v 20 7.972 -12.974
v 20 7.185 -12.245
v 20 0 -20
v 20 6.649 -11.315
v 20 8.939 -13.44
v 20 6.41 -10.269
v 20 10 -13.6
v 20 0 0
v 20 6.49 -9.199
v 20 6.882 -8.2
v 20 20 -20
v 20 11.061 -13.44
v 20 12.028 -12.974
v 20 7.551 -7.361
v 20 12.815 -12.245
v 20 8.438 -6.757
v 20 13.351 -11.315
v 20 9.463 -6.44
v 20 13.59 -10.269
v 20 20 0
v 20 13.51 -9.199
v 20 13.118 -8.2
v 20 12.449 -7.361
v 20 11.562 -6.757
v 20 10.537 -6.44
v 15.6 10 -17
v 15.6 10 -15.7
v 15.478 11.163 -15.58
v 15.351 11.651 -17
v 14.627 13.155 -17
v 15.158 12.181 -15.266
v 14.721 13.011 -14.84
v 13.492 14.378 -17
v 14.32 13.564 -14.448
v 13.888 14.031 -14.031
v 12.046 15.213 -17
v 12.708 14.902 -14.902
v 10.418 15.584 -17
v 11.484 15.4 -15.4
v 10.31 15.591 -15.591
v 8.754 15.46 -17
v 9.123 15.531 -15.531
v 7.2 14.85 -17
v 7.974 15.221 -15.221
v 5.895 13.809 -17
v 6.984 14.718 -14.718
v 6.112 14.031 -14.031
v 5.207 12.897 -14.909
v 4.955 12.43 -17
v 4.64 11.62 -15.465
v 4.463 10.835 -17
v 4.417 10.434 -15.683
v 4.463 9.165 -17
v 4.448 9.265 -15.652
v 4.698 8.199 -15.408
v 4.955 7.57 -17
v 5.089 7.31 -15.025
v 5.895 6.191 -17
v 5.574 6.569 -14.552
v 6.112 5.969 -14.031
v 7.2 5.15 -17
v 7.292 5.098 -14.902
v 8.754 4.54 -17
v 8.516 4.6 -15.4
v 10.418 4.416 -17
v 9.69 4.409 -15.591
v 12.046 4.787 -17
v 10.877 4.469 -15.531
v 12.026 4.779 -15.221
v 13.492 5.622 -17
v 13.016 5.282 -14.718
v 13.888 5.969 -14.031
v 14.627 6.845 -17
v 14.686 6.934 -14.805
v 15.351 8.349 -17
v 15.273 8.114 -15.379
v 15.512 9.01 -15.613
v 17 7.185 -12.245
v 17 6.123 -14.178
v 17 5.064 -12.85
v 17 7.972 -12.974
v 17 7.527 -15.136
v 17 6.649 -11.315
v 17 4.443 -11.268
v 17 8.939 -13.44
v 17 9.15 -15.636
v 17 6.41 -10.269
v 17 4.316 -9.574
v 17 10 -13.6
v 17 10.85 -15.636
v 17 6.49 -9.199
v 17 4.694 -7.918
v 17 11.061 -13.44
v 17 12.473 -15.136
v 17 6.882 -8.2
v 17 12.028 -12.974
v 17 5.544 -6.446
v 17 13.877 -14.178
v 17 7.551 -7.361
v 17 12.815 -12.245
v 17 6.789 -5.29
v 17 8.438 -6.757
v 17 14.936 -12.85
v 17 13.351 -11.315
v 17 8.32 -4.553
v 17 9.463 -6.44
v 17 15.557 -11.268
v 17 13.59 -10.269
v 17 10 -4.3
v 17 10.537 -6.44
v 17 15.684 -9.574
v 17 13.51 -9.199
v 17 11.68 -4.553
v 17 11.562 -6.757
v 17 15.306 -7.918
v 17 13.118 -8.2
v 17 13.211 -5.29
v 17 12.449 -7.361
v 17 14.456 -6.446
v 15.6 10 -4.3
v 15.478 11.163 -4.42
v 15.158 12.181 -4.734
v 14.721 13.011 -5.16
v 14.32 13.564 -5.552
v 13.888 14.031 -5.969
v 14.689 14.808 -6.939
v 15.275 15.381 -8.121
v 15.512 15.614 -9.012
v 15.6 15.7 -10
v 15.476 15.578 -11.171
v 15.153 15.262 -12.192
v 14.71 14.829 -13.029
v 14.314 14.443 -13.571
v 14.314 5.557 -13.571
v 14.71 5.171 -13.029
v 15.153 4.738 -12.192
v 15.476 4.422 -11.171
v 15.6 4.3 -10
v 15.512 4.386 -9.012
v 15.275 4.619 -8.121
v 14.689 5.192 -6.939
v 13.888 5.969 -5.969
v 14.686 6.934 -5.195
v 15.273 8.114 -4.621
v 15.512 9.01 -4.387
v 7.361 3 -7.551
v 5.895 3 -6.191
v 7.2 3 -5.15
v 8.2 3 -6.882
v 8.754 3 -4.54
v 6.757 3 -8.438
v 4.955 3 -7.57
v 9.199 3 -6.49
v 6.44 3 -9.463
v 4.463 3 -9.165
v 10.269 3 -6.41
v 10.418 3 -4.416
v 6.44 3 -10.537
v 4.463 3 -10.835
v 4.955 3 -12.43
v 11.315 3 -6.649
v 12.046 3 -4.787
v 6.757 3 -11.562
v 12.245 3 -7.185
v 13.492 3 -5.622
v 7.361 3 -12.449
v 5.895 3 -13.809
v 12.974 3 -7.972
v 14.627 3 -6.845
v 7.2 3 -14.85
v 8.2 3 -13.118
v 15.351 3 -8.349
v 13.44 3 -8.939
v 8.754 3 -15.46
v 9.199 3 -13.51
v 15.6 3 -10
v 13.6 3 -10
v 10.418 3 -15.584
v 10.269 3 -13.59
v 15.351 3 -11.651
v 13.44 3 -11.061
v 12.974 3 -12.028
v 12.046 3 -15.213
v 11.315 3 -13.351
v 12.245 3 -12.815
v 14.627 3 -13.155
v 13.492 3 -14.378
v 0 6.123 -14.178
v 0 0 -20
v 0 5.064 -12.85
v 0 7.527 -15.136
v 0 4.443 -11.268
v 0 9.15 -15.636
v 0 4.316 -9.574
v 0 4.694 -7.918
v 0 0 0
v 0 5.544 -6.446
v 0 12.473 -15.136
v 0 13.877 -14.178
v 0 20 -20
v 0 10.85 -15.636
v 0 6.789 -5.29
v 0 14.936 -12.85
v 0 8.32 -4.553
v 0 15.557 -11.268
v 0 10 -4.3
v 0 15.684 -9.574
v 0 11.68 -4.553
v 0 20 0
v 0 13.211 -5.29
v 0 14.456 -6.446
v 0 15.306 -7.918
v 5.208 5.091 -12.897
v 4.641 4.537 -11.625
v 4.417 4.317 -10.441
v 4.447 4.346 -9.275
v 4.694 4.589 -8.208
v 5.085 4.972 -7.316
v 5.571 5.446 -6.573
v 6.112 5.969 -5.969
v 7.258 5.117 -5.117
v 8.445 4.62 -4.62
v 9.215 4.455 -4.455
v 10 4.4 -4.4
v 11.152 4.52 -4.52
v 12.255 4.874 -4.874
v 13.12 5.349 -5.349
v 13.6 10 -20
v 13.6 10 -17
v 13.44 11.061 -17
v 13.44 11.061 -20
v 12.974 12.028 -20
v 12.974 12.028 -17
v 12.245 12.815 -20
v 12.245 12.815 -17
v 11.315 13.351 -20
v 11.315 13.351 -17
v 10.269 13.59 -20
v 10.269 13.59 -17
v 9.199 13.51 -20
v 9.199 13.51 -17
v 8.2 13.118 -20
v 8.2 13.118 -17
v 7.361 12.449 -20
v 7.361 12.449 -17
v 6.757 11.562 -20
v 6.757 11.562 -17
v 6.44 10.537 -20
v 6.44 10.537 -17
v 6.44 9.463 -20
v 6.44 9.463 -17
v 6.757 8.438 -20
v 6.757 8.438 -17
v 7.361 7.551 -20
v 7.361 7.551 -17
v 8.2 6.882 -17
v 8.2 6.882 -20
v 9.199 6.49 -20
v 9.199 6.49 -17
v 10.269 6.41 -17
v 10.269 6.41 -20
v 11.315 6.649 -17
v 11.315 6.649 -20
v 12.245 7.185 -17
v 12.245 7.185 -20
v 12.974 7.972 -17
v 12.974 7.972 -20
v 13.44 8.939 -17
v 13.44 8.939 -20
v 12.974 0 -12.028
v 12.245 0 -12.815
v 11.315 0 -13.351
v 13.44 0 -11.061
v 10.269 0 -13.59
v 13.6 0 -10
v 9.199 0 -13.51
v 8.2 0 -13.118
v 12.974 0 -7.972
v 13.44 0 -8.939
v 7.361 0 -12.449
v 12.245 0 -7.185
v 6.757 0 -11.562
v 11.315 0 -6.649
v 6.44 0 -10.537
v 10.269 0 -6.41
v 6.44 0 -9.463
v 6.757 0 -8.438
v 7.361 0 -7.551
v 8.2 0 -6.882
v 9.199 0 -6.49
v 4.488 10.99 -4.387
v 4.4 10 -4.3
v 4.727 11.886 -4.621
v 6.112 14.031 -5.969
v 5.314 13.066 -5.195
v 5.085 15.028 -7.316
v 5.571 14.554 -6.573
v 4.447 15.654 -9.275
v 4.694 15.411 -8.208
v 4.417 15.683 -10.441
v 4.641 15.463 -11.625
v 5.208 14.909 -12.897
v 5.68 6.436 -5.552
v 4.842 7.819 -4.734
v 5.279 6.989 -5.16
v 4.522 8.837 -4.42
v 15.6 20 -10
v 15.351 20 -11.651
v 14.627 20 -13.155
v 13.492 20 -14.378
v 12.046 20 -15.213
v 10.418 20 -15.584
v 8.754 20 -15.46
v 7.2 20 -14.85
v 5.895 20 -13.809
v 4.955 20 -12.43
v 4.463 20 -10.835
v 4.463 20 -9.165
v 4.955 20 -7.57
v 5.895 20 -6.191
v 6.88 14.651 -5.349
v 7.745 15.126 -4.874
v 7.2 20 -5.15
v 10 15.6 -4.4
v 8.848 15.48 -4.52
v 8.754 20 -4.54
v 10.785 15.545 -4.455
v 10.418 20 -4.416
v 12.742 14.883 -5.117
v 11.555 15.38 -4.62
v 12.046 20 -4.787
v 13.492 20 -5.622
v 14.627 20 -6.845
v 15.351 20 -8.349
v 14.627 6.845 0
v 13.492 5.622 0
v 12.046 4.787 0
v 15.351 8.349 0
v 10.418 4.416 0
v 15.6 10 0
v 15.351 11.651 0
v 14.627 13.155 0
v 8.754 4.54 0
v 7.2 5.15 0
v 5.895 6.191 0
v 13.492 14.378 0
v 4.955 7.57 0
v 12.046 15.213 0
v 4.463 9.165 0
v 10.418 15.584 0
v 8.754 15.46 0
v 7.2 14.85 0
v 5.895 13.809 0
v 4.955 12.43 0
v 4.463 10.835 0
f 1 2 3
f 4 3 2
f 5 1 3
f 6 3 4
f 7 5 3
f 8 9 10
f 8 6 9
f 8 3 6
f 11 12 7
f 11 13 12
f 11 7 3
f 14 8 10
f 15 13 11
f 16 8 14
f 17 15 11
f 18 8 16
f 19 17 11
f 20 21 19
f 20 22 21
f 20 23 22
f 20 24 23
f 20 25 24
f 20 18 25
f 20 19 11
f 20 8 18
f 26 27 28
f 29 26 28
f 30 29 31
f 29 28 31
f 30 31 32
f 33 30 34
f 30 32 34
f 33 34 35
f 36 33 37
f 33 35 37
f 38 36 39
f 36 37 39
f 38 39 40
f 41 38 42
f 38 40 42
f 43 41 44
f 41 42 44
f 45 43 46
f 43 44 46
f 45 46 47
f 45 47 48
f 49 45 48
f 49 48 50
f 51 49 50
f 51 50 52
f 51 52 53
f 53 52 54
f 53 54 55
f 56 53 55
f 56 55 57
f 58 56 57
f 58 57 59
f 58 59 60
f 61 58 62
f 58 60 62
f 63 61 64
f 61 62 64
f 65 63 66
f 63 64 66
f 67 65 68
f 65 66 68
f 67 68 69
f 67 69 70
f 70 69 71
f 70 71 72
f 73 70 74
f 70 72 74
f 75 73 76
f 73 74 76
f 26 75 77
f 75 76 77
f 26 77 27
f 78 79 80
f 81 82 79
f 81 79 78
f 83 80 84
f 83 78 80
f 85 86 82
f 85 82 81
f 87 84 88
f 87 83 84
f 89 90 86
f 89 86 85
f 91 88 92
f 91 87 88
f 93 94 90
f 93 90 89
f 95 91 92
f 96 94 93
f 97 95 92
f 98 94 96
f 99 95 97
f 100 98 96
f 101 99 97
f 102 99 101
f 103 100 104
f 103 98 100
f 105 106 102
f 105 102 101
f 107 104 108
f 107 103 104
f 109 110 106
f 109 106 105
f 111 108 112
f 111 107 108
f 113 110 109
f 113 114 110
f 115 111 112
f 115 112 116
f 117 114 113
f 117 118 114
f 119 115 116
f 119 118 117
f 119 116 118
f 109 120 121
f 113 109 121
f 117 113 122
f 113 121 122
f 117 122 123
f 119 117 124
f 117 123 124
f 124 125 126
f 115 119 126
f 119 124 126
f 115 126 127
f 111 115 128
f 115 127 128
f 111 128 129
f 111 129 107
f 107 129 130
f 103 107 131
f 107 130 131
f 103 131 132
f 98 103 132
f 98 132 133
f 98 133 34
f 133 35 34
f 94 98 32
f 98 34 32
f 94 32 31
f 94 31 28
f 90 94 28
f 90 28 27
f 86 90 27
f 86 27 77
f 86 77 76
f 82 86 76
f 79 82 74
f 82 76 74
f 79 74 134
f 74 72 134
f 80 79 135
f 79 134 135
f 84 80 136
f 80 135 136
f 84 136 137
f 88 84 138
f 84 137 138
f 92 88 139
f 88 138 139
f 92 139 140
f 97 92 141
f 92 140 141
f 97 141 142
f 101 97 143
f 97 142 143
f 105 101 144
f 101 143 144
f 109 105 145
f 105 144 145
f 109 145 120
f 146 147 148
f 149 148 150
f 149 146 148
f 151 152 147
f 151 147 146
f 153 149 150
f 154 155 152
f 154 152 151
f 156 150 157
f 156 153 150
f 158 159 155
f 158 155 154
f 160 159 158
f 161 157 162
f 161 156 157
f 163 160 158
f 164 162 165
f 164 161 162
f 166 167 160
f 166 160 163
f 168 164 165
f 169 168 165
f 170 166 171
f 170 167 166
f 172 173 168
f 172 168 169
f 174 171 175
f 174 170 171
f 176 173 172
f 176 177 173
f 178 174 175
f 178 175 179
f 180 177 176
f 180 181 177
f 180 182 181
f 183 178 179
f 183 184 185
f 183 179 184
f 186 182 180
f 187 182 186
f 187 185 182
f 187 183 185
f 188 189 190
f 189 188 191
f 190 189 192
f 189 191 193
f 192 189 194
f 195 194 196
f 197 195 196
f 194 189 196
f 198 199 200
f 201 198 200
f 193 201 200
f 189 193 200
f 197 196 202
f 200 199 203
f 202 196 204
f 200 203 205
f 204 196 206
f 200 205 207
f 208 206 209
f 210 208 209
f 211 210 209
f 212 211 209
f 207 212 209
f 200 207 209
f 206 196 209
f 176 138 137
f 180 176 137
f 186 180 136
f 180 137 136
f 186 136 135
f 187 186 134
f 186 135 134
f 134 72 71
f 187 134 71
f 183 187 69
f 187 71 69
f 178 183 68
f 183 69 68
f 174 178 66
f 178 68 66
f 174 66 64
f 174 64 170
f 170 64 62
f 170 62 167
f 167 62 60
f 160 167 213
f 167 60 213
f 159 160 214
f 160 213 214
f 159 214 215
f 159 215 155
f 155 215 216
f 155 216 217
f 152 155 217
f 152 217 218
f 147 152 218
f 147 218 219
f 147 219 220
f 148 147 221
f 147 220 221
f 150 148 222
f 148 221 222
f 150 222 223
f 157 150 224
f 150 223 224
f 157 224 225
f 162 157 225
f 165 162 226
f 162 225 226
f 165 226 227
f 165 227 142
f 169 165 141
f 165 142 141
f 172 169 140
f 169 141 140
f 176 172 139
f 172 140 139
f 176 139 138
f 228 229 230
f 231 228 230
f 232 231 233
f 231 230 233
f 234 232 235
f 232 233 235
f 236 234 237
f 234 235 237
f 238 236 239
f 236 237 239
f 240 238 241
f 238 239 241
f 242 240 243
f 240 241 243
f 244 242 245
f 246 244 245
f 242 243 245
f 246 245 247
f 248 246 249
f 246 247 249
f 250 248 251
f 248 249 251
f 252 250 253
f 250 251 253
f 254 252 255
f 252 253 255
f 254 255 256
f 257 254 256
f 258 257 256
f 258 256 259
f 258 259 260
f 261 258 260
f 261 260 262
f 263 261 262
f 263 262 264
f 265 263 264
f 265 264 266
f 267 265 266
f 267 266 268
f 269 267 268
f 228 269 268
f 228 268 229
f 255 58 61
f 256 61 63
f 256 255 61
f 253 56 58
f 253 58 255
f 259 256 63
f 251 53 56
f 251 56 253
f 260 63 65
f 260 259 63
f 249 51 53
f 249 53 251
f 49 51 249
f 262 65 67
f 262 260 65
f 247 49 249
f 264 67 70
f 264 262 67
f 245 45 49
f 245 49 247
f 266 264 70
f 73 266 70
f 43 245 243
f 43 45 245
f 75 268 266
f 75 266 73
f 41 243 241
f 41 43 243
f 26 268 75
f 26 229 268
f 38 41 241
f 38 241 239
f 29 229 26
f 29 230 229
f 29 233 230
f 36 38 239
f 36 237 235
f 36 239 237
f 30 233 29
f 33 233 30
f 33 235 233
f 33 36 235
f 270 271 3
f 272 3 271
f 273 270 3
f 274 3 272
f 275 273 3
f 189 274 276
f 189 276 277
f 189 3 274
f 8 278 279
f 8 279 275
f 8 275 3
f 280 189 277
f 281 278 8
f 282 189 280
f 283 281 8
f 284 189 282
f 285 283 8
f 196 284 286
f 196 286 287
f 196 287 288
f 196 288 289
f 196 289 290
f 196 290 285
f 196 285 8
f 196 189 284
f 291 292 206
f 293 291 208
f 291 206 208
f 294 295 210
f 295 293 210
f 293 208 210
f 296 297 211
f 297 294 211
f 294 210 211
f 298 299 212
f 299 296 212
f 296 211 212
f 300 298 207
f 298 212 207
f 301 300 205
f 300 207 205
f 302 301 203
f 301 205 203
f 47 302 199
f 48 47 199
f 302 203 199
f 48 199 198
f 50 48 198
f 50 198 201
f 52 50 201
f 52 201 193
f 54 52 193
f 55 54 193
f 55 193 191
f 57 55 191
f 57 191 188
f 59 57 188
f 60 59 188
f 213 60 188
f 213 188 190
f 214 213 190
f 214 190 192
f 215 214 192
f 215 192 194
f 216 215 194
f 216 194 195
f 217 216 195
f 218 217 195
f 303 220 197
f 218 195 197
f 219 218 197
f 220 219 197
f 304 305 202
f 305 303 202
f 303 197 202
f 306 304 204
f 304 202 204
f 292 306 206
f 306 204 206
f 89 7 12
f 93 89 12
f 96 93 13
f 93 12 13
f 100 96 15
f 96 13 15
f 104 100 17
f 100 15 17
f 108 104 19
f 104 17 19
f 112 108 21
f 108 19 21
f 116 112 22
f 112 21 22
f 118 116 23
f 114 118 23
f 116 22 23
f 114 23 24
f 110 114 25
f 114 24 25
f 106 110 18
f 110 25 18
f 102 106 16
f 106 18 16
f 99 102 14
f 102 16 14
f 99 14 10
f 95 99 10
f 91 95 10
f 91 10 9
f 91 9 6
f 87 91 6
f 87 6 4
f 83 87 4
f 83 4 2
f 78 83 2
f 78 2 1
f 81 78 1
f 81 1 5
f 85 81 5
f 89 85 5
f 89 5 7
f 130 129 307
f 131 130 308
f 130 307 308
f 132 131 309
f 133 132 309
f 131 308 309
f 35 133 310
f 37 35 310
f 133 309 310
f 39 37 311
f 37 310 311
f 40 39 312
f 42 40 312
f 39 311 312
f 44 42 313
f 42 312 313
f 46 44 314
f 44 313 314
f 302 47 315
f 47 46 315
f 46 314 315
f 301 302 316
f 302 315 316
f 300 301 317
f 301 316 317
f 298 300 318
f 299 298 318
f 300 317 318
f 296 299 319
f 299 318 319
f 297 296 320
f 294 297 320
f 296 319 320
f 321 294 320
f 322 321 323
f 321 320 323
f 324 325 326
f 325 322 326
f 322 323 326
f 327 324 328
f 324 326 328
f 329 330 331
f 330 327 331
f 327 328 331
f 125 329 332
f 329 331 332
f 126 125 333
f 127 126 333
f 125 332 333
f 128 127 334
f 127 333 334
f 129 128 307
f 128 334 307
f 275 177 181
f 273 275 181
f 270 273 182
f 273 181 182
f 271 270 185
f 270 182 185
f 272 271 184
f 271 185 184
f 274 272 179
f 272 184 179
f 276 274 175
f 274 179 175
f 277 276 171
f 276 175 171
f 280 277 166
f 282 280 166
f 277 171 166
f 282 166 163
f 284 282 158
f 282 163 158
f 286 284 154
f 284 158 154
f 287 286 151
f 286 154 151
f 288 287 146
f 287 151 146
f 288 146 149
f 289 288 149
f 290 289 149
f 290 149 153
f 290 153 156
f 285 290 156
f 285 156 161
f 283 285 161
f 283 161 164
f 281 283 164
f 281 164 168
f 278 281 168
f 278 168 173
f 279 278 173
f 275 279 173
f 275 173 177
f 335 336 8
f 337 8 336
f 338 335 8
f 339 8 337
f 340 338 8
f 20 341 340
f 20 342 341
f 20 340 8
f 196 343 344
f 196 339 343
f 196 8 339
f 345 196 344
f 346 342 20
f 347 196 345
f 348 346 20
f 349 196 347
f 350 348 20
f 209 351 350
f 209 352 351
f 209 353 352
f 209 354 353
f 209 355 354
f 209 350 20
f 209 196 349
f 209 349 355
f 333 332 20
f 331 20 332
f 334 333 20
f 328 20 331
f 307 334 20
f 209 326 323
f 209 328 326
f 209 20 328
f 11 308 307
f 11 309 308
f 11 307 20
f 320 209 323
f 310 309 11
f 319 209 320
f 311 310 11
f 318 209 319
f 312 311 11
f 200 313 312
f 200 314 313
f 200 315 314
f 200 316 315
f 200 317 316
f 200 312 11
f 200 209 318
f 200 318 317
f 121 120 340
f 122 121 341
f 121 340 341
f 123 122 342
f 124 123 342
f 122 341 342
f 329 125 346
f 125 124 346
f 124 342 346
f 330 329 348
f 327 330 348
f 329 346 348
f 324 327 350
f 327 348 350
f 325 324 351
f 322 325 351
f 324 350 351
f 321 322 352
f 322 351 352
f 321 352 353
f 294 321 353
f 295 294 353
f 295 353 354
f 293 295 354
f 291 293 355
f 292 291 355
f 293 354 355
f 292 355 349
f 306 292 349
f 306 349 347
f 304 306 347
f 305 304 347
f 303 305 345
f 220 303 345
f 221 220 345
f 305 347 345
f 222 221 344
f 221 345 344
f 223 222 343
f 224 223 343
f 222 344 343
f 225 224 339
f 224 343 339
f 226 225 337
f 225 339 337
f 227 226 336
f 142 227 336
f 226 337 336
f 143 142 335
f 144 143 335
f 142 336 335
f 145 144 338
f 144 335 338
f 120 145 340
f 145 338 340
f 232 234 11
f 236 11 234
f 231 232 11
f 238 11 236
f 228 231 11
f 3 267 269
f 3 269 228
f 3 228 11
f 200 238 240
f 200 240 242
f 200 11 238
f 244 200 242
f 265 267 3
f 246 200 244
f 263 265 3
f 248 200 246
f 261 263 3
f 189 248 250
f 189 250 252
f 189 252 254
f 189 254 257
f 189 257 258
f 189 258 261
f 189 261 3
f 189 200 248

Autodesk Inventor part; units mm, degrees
ref_plane "YZ Plane" through (0, 0, 0) normal (1, 0, 0) x (0, 1, 0)
ref_plane "XZ Plane" through (0, 0, 0) normal (0, 1, 0) x (-1, 0, 0)
ref_plane "XY Plane" through (0, 0, 0) normal (0, 0, 1) x (1, 0, 0)
sketch "Sketch1" plane through (0, 0, 0) normal (1, 0, 0) x (0, 1, 0)
  line L0 (0, 0) -> (20, 0)
  line L1 (20, 0) -> (20, -20)
  line L2 (20, -20) -> (0, -20)
  line L3 (0, -20) -> (0, 0)
  dimension "d0" = 20
  dimension "d1" = 20
extrude "Extrusion1" add sketch "Sketch1" along normal blind 20
sketch "Sketch2" plane through (0, 0, 0) normal (0, 0, 1) x (1, 0, 0)
  circle A0 centre (10, 10) radius 3.6
  line L0 (0, 20) -> (0, 0) projected
  line L1 (0, 20) -> (20, 20) projected
  dimension "d4" = 10
  dimension "d5" = 10
  dimension "d6" = 7.2
extrude "Extrusion2" cut sketch "Sketch2" against normal blind 20
sketch "Sketch3" plane through (20, 0, 0) normal (1, 0, 0) x (0, 0, -1)
  circle A0 centre (10, 10) radius 3.6
  line L0 (20, 20) -> (0, 20) projected
  line L1 (0, 20) -> (0, 0) projected
  dimension "d9" = 10
  dimension "d10" = 10
  dimension "d11" = 7.2
extrude "Extrusion3" cut sketch "Sketch3" against normal blind 20
sketch "Sketch4" plane through (0, 20, 0) normal (0, 1, 0) x (1, 0, 0)
  line L0 (13.6, 6.4) -> (10, 10) projected
  circle A0 centre (10, 10) radius 3.6
  line L1 (20, 20) -> (20, 0) projected
  line L2 (0, 0) -> (20, 0) projected
  dimension "d14" = 7.2
  dimension "d15" = 10
  dimension "d16" = 10
extrude "Extrusion4" cut sketch "Sketch4" against normal blind 20
sketch "Sketch5" plane through (0, 0, 0) normal (-1, 0, 0) x (0, 0, 1)
  circle A0 centre (-10, 10) radius 3.6 projected
  circle A1 centre (-10, 10) radius 5.7
  point P0 (0, 0)
  dimension "d19" = 11.4
extrude "Extrusion5" cut sketch "Sketch5" against normal blind 17 contours A0 | A1
sketch "Sketch6" plane through (0, 0, 0) normal (0, 0, 1) x (1, 0, 0)
  circle A0 centre (10, 10) radius 3.6 projected
  circle A1 centre (10, 10) radius 5.6
  point P0 (0, 0)
  dimension "d22" = 11.2
extrude "Extrusion6" cut sketch "Sketch6" against normal blind 17 contours A0 | A1
sketch "Sketch7" plane through (0, 20, 0) normal (0, 1, 0) x (1, 0, 0)
  circle A0 centre (10, 10) radius 3.6 projected
  circle A1 centre (10, 10) radius 5.6
  point P0 (0, 0)
  dimension "d25" = 11.2
extrude "Extrusion7" cut sketch "Sketch7" against normal blind 17 contours A0 | A1
properties part number "2020CubeConnector" material "Aluminum 6061-AHC"
